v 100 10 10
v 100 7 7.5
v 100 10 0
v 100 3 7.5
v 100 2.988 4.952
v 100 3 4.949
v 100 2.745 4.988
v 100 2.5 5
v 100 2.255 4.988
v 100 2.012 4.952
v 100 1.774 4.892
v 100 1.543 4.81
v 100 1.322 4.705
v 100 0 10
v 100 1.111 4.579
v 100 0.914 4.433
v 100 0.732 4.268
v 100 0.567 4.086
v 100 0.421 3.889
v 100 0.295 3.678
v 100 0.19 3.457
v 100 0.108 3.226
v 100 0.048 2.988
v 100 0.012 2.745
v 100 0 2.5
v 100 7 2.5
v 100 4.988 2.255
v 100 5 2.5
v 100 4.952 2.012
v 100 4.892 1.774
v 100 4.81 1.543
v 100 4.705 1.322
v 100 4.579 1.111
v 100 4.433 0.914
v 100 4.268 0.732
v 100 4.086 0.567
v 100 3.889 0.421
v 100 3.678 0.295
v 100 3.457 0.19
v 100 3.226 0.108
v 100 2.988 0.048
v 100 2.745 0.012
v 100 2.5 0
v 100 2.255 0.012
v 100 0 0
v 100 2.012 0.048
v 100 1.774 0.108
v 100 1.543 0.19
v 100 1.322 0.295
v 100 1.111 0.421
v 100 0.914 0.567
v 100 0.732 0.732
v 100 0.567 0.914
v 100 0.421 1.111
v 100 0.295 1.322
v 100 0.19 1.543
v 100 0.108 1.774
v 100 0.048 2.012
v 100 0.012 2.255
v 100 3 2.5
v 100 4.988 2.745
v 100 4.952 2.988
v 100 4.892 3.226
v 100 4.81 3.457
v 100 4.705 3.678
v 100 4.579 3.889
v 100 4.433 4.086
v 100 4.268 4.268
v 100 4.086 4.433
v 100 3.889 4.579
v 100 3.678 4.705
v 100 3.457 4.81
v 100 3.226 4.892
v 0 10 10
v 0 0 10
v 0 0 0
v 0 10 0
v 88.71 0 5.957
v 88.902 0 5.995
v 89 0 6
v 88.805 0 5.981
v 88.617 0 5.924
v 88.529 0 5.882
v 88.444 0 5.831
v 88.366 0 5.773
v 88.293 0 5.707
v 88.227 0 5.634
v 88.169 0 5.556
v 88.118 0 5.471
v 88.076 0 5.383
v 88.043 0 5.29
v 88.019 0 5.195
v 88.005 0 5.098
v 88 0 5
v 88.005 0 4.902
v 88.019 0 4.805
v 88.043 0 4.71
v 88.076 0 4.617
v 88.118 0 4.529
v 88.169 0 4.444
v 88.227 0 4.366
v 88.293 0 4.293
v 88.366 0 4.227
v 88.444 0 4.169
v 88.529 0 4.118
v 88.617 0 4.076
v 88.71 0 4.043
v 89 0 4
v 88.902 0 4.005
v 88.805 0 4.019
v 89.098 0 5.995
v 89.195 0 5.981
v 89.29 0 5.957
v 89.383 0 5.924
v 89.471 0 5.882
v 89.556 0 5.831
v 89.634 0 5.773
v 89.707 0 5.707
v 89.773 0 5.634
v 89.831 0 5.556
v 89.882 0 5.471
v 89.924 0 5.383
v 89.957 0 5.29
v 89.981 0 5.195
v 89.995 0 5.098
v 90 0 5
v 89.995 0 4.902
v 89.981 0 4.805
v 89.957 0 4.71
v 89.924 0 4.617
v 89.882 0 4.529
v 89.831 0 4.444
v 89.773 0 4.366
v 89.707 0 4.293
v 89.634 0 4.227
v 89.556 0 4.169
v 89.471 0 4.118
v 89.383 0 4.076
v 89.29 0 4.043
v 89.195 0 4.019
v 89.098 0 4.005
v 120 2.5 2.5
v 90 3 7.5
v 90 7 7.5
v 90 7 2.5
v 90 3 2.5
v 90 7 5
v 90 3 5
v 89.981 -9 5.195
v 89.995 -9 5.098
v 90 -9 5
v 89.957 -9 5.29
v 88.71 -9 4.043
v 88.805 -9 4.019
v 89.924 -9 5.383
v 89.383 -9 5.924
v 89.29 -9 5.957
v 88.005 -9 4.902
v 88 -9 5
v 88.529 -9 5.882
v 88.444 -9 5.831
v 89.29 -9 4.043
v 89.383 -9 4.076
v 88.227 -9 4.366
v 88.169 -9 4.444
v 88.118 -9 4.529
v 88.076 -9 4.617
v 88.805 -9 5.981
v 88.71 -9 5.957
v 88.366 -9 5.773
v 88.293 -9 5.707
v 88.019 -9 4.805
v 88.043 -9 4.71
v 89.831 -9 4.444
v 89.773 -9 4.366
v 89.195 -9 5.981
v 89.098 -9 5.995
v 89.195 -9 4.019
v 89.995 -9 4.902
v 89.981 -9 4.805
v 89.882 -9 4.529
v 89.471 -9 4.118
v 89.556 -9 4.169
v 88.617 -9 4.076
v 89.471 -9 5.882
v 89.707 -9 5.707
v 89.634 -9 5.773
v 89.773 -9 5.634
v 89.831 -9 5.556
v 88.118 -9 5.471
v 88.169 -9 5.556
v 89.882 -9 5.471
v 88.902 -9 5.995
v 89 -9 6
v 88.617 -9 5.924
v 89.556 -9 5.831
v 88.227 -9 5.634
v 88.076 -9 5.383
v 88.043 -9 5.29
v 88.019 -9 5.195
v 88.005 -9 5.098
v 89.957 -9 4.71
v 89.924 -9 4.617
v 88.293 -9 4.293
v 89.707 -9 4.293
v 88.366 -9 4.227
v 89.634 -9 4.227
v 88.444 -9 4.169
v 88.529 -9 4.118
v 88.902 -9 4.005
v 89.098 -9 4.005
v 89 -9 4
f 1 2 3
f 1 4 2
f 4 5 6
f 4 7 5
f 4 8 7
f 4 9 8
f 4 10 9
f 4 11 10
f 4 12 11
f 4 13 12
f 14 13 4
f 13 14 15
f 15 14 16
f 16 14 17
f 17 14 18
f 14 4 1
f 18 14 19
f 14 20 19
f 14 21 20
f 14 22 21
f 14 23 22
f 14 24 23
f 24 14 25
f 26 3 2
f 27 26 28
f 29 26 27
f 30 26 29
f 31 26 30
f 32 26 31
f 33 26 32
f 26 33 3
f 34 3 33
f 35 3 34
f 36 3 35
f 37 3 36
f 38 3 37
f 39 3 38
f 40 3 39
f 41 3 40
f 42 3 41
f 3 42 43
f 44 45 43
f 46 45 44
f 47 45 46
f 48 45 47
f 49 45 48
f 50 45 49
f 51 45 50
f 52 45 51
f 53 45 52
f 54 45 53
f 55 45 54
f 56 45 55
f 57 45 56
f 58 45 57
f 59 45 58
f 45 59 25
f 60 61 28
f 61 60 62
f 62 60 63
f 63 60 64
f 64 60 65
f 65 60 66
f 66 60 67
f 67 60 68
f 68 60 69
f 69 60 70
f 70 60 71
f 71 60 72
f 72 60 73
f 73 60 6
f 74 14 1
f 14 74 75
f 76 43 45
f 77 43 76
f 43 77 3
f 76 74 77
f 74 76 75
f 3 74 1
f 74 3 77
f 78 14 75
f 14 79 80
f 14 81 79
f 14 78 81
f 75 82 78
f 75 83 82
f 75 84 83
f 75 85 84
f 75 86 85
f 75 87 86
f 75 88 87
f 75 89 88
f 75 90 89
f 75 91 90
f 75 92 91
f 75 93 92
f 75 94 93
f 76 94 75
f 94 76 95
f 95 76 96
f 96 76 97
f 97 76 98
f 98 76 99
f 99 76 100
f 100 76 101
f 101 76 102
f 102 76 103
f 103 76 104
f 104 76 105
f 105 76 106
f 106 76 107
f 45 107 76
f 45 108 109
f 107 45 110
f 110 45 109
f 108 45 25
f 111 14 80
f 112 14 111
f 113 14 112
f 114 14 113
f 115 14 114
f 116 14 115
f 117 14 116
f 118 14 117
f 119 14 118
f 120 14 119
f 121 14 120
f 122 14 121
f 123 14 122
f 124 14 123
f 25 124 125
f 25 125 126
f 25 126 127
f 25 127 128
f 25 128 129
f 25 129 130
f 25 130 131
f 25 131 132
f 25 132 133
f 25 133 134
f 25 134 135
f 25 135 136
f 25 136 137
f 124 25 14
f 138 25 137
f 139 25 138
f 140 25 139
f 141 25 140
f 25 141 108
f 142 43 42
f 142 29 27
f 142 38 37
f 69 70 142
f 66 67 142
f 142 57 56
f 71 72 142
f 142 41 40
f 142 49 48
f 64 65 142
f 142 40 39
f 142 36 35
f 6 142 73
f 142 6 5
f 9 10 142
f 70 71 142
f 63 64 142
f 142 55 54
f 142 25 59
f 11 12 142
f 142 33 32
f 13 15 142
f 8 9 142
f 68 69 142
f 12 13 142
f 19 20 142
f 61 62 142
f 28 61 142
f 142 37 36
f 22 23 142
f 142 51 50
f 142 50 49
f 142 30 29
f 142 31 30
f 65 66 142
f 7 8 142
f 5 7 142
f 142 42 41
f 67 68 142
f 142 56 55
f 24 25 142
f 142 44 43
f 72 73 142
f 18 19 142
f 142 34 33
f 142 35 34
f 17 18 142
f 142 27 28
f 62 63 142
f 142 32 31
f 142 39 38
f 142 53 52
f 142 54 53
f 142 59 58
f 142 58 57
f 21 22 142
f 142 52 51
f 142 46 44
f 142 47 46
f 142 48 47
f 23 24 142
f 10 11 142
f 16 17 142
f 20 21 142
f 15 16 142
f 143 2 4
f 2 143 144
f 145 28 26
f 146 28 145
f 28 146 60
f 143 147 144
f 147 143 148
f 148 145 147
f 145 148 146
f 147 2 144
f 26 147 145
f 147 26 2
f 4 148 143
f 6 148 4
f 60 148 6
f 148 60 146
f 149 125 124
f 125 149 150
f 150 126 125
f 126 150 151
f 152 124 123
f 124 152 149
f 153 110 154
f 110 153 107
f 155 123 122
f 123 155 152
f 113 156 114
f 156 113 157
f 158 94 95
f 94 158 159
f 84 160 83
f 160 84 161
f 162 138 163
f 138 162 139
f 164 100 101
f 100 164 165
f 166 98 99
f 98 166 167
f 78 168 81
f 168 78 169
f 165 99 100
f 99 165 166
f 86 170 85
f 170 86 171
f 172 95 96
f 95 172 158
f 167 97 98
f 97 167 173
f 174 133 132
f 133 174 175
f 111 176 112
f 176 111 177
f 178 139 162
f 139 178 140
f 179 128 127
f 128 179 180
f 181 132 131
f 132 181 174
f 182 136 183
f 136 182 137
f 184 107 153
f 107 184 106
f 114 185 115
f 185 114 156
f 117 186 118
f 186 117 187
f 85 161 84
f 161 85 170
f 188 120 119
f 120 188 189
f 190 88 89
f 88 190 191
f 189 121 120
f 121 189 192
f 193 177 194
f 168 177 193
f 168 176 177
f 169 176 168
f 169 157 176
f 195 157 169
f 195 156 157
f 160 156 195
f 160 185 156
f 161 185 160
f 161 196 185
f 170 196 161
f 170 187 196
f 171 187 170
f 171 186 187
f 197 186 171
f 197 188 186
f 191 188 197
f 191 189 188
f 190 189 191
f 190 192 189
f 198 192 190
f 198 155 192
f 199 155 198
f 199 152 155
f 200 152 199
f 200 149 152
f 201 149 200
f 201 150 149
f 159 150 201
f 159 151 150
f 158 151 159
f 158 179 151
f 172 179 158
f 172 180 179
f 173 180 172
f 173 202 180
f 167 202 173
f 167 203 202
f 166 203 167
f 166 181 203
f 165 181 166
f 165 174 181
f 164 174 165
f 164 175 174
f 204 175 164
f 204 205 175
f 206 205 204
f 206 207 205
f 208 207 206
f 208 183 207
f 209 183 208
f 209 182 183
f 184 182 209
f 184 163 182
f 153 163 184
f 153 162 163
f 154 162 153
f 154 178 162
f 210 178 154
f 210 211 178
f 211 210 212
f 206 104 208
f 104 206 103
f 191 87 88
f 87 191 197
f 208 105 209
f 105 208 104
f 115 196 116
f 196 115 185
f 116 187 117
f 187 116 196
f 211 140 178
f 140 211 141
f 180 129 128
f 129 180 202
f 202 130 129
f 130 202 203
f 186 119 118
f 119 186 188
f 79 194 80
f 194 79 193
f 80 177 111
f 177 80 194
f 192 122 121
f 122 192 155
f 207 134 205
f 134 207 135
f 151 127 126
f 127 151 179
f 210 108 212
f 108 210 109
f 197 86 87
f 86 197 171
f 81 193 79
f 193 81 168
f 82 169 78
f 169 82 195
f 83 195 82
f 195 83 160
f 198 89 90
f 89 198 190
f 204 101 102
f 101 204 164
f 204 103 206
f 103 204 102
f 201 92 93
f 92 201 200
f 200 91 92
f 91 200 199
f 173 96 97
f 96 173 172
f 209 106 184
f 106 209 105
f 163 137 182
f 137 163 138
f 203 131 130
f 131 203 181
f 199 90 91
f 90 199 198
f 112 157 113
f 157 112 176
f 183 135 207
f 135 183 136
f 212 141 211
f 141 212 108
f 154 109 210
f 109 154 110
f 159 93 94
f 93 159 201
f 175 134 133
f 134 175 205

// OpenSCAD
module prismatic_bar() {
    // Main body dimensions
    body_length = 100;
    body_width = 10;
    body_height = 10;
    
    // Tapered nose dimensions
    nose_length = 20;
    nose_width = 5;
    nose_height = 5;
    
    // Forked end dimensions
    fork_length = 10;
    fork_width = 10;
    fork_height = 10;
    slot_width = 4;
    slot_depth = 5;
    
    // Hole dimensions
    hole_diameter = 2;
    hole_spacing = 4;
    
    // Create the main body with a tapered nose
    difference() {
        union() {
            // Main body
            translate([0, 0, 0])
                cube([body_length, body_width, body_height]);
            
            // Tapered nose
            translate([body_length, (body_width - nose_width) / 2, (body_height - nose_height) / 2])
                scale([1, nose_width / body_width, nose_height / body_height])
                rotate([0, 90, 0])
                cylinder(h = nose_length, r1 = body_width / 2, r2 = 0, $fn = 64);
        }
        
        // Forked U-shaped slot
        translate([body_length - fork_length, (body_width - slot_width) / 2, (body_height - slot_depth) / 2])
            cube([fork_length, slot_width, slot_depth]);
    }
    
    // Add holes on the wider end
    for (i = [-1, 0, 1]) {
        translate([body_length - fork_length - 1, body_width / 2 + i * hole_spacing, body_height / 2])
            rotate([90, 0, 0])
            cylinder(h = body_width, d = hole_diameter, $fn = 64);
    }
}

prismatic_bar();
